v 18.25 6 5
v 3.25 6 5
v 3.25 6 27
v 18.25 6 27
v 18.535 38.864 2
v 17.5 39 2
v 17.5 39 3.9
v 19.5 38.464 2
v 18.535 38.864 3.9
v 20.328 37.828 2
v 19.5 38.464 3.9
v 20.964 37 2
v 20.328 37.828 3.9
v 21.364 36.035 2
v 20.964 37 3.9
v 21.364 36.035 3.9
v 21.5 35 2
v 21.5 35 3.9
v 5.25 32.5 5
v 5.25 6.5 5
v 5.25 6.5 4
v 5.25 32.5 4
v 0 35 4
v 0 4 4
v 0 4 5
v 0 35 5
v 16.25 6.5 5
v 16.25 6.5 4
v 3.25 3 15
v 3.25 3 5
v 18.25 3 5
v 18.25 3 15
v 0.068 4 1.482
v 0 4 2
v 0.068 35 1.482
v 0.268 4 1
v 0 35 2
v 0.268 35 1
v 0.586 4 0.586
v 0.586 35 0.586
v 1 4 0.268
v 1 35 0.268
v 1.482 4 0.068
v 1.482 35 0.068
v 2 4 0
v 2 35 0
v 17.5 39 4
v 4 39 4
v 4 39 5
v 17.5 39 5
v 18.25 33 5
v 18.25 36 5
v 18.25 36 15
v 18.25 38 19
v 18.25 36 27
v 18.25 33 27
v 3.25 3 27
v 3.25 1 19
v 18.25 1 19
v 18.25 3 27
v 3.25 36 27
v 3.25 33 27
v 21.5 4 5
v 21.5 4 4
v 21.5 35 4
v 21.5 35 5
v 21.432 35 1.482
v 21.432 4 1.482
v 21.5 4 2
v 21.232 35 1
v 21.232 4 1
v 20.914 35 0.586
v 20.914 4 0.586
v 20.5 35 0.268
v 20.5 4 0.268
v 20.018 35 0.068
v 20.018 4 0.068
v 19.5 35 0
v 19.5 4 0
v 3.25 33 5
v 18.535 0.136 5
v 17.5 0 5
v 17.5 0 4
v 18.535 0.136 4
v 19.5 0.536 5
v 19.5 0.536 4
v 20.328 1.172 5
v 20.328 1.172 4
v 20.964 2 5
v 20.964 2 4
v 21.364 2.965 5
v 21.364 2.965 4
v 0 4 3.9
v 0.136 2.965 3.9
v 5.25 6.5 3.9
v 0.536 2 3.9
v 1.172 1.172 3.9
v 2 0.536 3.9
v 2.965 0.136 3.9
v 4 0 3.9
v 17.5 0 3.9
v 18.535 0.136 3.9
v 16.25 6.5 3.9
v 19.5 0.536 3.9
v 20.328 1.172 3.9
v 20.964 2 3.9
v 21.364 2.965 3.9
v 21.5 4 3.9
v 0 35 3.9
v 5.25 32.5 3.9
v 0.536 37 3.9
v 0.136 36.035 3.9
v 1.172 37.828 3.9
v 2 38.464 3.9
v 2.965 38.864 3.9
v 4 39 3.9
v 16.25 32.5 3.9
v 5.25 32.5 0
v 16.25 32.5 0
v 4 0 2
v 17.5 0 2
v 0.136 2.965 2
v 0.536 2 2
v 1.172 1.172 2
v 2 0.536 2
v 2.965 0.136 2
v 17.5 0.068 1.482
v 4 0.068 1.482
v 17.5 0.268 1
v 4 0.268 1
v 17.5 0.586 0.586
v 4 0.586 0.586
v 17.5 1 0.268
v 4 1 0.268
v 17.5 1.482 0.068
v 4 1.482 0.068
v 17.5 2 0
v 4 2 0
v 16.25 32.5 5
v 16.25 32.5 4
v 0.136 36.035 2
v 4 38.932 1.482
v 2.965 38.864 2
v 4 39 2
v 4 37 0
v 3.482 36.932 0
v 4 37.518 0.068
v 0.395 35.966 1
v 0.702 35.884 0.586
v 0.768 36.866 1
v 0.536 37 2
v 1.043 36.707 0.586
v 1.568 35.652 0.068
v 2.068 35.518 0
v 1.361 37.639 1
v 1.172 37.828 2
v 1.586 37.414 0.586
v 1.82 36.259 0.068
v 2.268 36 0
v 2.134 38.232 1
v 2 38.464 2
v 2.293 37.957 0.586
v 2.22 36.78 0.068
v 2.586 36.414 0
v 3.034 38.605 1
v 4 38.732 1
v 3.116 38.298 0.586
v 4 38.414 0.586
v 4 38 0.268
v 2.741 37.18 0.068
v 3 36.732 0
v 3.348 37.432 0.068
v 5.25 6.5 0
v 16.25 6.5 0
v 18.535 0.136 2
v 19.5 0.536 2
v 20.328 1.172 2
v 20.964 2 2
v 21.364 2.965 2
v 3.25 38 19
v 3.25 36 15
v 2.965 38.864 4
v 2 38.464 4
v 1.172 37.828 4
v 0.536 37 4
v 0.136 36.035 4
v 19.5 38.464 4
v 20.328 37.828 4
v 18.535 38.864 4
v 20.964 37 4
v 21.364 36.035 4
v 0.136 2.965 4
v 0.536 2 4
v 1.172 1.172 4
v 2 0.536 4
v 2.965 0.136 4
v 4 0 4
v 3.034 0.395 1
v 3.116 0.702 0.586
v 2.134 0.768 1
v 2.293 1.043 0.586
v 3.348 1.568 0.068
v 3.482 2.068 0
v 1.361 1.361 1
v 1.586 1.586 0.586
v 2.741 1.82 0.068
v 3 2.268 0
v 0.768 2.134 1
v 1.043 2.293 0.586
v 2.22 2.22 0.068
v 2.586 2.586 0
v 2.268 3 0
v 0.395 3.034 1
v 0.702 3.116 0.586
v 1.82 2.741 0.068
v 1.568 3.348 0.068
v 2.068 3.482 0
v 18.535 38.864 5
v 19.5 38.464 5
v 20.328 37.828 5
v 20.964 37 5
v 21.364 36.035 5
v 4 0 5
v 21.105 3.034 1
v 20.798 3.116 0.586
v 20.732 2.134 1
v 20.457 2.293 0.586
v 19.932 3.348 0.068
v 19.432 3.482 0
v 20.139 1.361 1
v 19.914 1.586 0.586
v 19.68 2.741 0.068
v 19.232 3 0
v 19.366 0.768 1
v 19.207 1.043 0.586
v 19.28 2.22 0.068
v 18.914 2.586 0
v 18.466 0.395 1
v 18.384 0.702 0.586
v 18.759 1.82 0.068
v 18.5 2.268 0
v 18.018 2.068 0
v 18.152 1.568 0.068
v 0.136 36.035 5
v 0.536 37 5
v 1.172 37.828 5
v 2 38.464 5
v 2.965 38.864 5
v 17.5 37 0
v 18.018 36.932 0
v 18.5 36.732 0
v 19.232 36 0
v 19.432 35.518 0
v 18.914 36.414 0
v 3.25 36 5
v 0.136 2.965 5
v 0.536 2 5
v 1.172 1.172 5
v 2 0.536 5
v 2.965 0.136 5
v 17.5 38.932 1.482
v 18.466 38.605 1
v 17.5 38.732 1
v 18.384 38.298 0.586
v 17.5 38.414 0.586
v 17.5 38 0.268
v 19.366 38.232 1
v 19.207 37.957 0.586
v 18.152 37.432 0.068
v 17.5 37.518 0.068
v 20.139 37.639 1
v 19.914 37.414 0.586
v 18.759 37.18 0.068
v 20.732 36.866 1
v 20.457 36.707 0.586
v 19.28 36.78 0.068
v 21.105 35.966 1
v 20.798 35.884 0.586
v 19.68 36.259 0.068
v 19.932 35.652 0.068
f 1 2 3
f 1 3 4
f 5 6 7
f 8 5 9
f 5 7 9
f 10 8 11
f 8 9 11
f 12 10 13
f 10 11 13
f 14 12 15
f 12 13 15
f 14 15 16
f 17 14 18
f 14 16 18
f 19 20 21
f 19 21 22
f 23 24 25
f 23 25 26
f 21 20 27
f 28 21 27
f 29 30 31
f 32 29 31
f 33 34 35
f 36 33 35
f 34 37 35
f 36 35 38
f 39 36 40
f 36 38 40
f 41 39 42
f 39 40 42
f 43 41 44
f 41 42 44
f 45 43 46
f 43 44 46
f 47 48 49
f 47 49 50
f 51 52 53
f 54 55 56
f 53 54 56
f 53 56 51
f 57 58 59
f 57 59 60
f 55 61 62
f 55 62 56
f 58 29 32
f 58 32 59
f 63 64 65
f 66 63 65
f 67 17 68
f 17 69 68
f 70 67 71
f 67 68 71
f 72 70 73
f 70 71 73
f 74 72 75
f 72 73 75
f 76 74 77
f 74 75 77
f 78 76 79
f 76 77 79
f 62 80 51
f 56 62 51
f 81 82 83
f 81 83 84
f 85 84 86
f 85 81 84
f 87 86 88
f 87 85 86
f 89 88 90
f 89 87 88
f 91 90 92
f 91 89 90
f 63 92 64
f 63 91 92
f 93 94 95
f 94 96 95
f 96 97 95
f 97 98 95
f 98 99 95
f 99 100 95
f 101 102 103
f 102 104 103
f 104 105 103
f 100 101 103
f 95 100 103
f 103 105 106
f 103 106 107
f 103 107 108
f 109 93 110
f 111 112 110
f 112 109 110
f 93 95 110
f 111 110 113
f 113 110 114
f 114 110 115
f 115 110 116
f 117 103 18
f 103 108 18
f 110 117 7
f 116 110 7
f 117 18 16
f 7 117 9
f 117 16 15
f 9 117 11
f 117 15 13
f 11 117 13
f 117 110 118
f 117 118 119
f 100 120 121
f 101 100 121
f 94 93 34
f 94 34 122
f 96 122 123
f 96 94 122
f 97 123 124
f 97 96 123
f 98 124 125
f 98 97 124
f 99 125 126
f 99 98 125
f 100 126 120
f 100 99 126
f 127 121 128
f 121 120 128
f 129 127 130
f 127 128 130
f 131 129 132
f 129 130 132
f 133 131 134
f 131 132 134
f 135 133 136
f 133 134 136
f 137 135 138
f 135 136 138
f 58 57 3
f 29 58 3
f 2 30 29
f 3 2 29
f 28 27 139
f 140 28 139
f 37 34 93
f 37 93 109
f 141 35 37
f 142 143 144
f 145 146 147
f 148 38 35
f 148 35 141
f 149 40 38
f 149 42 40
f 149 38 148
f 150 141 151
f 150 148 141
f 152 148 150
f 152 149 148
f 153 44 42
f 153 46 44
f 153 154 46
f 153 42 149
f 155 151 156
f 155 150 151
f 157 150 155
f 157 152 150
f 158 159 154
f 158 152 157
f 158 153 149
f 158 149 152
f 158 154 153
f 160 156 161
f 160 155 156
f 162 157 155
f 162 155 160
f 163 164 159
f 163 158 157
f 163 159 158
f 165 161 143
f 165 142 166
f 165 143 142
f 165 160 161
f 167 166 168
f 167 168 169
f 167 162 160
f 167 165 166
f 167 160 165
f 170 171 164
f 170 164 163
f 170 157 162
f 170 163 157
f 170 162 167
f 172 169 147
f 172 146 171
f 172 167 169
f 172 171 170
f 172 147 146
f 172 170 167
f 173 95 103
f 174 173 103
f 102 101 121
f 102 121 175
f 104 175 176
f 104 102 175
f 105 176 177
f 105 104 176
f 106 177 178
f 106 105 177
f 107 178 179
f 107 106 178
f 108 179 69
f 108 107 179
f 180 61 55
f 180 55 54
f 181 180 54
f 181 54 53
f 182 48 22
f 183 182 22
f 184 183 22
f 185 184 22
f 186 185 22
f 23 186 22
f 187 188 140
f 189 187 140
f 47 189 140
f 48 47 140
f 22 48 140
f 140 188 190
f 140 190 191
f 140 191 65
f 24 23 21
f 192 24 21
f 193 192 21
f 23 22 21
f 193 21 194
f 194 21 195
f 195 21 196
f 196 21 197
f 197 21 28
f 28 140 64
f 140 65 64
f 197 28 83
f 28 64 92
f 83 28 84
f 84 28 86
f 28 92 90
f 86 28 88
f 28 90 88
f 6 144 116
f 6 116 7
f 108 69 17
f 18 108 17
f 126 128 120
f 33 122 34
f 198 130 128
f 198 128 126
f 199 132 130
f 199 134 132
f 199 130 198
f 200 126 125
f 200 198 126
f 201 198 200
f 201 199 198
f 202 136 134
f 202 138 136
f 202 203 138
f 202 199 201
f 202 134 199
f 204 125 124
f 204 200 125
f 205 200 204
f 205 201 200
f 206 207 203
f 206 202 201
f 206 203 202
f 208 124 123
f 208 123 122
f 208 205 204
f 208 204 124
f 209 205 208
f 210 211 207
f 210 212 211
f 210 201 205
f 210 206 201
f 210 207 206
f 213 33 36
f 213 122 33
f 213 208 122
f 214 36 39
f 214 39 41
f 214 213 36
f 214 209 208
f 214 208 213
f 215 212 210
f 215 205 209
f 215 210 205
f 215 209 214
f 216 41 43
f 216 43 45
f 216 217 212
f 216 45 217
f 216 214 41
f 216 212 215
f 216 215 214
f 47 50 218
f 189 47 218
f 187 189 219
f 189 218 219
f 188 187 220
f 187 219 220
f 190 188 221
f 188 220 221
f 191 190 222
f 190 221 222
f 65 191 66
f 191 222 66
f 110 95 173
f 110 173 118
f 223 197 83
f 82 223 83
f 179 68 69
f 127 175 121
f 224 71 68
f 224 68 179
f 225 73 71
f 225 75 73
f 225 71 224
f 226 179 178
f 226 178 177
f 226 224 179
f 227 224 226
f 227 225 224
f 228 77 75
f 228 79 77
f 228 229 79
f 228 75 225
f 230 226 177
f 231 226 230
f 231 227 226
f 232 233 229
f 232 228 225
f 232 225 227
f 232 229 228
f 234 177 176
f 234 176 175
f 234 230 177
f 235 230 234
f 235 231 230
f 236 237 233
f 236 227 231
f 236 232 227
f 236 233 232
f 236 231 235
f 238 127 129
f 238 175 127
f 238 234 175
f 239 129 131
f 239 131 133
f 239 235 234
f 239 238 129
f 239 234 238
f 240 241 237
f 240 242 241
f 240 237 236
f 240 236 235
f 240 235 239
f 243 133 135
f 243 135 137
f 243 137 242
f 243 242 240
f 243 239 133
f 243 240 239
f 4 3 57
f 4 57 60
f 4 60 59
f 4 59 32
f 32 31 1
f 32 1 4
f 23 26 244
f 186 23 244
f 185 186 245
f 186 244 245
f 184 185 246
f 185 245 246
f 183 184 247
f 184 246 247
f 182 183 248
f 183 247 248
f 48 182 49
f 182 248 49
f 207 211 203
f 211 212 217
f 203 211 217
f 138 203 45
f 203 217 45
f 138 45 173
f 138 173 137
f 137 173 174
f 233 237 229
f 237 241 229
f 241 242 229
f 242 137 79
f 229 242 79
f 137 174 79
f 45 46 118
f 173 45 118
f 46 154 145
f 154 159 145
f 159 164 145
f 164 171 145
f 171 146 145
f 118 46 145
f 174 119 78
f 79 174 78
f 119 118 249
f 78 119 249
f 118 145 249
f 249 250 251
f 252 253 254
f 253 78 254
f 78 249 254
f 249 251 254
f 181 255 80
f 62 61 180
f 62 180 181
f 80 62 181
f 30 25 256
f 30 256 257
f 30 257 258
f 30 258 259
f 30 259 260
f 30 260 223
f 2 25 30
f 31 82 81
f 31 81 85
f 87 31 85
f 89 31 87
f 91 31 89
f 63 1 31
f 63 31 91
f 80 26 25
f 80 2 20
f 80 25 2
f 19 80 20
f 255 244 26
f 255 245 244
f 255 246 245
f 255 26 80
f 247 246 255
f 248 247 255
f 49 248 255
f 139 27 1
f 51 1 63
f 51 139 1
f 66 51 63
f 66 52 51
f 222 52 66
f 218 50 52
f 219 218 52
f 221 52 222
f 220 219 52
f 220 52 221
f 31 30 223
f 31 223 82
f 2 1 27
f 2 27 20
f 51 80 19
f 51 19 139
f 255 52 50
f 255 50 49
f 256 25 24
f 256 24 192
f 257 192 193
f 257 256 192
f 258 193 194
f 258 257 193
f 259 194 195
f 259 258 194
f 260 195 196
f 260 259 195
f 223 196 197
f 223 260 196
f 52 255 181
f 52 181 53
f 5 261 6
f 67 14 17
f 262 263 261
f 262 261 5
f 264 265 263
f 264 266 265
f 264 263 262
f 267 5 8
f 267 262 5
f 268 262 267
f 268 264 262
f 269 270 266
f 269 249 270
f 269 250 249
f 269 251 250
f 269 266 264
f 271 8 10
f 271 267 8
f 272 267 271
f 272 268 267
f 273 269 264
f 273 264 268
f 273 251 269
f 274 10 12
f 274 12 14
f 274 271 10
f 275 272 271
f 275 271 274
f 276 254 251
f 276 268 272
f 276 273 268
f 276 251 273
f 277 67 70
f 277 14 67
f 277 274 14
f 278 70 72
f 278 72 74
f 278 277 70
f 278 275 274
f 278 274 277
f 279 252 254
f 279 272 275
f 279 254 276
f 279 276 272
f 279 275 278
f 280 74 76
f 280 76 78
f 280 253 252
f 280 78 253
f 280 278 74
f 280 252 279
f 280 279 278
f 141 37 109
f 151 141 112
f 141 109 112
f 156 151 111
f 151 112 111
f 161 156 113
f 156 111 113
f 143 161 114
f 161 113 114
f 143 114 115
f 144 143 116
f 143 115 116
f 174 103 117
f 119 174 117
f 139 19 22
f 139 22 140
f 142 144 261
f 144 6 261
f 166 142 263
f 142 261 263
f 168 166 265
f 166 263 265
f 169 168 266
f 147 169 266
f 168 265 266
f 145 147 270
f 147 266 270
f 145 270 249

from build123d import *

# Parameters (mm, degrees)
F0_W      = 21.5
F0_H      = 39
F1_DEPTH  = 5
F2_W      = 15
F2_H      = 3
F3_DEPTH  = 22
F5_DEPTH  = 15
F6_R      = 4
F7_R      = 2
F8_W      = 11
F8_H      = 26
F9_DEPTH  = 6
F10_W     = 31
F10_H     = 0.1
F10_W_2   = 5.1652195826
F10_W_3   = 13.8347804174
F11_DEPTH = 40


with BuildPart() as f1:
    # F0 (on Top) → F1 (new body)
    with BuildSketch(Plane.XY):
        with Locations((10.75, 19.5)):
            Rectangle(F0_W, F0_H)
    extrude(amount=F1_DEPTH)

    # F2 (on face) → F3 (join)
    with BuildSketch(Plane.XY.offset(5)):
        with Locations((10.75, 34.5)):
            Rectangle(F2_W, F2_H)
        with Locations((10.75, 4.5)):
            Rectangle(F2_W, F2_H)
    extrude(amount=F3_DEPTH)

    # F4 (on face) → F5 (join)
    with BuildSketch(Plane(origin=(3.25, 0, 0), x_dir=(0, -1, 0), z_dir=(-1, 0, 0))):
        Polygon((-36, 15), (-36, 27), (-38, 19), align=None)
        Polygon((-1, 19), (-3, 27), (-3, 15), align=None)
    extrude(amount=-F5_DEPTH)

    # F6
    f6_edges = [f1.edges().sort_by_distance(p)[0] for p in [
        (0, 39, 2.5),
        (0, 0, 2.5),
        (21.5, 0, 2.5),
        (21.5, 39, 2.5),
    ]]
    fillet(f6_edges, radius=F6_R)

    # F7
    f7_edges = [f1.edges().sort_by_distance(p)[0] for p in [
        (0, 19.5, 0),
        (1.171573, 37.828427, 0),
        (1.171573, 1.171573, 0),
        (10.75, 39, 0),
        (10.75, 0, 0),
        (20.328427, 37.828427, 0),
        (20.328427, 1.171573, 0),
        (21.5, 19.5, 0),
    ]]
    fillet(f7_edges, radius=F7_R)

    # F8 (on face) → F9 (cut)
    with BuildSketch(Plane.XY.offset(5)):
        with Locations((10.75, 19.5)):
            Rectangle(F8_W, F8_H)
    extrude(amount=-F9_DEPTH, mode=Mode.SUBTRACT)

    # F10 (on face) → F11 (cut)
    with BuildSketch(Plane.YZ.offset(21.5)):
        with Locations((19.5, 3.95)):
            Rectangle(F10_W, F10_H)
        with Locations((1.4173902087, 3.95)):
            Rectangle(F10_W_2, F10_H)
        with Locations((41.9173902087, 3.95)):
            Rectangle(F10_W_3, F10_H)
    extrude(amount=-F11_DEPTH, mode=Mode.SUBTRACT)


solid = f1.part
